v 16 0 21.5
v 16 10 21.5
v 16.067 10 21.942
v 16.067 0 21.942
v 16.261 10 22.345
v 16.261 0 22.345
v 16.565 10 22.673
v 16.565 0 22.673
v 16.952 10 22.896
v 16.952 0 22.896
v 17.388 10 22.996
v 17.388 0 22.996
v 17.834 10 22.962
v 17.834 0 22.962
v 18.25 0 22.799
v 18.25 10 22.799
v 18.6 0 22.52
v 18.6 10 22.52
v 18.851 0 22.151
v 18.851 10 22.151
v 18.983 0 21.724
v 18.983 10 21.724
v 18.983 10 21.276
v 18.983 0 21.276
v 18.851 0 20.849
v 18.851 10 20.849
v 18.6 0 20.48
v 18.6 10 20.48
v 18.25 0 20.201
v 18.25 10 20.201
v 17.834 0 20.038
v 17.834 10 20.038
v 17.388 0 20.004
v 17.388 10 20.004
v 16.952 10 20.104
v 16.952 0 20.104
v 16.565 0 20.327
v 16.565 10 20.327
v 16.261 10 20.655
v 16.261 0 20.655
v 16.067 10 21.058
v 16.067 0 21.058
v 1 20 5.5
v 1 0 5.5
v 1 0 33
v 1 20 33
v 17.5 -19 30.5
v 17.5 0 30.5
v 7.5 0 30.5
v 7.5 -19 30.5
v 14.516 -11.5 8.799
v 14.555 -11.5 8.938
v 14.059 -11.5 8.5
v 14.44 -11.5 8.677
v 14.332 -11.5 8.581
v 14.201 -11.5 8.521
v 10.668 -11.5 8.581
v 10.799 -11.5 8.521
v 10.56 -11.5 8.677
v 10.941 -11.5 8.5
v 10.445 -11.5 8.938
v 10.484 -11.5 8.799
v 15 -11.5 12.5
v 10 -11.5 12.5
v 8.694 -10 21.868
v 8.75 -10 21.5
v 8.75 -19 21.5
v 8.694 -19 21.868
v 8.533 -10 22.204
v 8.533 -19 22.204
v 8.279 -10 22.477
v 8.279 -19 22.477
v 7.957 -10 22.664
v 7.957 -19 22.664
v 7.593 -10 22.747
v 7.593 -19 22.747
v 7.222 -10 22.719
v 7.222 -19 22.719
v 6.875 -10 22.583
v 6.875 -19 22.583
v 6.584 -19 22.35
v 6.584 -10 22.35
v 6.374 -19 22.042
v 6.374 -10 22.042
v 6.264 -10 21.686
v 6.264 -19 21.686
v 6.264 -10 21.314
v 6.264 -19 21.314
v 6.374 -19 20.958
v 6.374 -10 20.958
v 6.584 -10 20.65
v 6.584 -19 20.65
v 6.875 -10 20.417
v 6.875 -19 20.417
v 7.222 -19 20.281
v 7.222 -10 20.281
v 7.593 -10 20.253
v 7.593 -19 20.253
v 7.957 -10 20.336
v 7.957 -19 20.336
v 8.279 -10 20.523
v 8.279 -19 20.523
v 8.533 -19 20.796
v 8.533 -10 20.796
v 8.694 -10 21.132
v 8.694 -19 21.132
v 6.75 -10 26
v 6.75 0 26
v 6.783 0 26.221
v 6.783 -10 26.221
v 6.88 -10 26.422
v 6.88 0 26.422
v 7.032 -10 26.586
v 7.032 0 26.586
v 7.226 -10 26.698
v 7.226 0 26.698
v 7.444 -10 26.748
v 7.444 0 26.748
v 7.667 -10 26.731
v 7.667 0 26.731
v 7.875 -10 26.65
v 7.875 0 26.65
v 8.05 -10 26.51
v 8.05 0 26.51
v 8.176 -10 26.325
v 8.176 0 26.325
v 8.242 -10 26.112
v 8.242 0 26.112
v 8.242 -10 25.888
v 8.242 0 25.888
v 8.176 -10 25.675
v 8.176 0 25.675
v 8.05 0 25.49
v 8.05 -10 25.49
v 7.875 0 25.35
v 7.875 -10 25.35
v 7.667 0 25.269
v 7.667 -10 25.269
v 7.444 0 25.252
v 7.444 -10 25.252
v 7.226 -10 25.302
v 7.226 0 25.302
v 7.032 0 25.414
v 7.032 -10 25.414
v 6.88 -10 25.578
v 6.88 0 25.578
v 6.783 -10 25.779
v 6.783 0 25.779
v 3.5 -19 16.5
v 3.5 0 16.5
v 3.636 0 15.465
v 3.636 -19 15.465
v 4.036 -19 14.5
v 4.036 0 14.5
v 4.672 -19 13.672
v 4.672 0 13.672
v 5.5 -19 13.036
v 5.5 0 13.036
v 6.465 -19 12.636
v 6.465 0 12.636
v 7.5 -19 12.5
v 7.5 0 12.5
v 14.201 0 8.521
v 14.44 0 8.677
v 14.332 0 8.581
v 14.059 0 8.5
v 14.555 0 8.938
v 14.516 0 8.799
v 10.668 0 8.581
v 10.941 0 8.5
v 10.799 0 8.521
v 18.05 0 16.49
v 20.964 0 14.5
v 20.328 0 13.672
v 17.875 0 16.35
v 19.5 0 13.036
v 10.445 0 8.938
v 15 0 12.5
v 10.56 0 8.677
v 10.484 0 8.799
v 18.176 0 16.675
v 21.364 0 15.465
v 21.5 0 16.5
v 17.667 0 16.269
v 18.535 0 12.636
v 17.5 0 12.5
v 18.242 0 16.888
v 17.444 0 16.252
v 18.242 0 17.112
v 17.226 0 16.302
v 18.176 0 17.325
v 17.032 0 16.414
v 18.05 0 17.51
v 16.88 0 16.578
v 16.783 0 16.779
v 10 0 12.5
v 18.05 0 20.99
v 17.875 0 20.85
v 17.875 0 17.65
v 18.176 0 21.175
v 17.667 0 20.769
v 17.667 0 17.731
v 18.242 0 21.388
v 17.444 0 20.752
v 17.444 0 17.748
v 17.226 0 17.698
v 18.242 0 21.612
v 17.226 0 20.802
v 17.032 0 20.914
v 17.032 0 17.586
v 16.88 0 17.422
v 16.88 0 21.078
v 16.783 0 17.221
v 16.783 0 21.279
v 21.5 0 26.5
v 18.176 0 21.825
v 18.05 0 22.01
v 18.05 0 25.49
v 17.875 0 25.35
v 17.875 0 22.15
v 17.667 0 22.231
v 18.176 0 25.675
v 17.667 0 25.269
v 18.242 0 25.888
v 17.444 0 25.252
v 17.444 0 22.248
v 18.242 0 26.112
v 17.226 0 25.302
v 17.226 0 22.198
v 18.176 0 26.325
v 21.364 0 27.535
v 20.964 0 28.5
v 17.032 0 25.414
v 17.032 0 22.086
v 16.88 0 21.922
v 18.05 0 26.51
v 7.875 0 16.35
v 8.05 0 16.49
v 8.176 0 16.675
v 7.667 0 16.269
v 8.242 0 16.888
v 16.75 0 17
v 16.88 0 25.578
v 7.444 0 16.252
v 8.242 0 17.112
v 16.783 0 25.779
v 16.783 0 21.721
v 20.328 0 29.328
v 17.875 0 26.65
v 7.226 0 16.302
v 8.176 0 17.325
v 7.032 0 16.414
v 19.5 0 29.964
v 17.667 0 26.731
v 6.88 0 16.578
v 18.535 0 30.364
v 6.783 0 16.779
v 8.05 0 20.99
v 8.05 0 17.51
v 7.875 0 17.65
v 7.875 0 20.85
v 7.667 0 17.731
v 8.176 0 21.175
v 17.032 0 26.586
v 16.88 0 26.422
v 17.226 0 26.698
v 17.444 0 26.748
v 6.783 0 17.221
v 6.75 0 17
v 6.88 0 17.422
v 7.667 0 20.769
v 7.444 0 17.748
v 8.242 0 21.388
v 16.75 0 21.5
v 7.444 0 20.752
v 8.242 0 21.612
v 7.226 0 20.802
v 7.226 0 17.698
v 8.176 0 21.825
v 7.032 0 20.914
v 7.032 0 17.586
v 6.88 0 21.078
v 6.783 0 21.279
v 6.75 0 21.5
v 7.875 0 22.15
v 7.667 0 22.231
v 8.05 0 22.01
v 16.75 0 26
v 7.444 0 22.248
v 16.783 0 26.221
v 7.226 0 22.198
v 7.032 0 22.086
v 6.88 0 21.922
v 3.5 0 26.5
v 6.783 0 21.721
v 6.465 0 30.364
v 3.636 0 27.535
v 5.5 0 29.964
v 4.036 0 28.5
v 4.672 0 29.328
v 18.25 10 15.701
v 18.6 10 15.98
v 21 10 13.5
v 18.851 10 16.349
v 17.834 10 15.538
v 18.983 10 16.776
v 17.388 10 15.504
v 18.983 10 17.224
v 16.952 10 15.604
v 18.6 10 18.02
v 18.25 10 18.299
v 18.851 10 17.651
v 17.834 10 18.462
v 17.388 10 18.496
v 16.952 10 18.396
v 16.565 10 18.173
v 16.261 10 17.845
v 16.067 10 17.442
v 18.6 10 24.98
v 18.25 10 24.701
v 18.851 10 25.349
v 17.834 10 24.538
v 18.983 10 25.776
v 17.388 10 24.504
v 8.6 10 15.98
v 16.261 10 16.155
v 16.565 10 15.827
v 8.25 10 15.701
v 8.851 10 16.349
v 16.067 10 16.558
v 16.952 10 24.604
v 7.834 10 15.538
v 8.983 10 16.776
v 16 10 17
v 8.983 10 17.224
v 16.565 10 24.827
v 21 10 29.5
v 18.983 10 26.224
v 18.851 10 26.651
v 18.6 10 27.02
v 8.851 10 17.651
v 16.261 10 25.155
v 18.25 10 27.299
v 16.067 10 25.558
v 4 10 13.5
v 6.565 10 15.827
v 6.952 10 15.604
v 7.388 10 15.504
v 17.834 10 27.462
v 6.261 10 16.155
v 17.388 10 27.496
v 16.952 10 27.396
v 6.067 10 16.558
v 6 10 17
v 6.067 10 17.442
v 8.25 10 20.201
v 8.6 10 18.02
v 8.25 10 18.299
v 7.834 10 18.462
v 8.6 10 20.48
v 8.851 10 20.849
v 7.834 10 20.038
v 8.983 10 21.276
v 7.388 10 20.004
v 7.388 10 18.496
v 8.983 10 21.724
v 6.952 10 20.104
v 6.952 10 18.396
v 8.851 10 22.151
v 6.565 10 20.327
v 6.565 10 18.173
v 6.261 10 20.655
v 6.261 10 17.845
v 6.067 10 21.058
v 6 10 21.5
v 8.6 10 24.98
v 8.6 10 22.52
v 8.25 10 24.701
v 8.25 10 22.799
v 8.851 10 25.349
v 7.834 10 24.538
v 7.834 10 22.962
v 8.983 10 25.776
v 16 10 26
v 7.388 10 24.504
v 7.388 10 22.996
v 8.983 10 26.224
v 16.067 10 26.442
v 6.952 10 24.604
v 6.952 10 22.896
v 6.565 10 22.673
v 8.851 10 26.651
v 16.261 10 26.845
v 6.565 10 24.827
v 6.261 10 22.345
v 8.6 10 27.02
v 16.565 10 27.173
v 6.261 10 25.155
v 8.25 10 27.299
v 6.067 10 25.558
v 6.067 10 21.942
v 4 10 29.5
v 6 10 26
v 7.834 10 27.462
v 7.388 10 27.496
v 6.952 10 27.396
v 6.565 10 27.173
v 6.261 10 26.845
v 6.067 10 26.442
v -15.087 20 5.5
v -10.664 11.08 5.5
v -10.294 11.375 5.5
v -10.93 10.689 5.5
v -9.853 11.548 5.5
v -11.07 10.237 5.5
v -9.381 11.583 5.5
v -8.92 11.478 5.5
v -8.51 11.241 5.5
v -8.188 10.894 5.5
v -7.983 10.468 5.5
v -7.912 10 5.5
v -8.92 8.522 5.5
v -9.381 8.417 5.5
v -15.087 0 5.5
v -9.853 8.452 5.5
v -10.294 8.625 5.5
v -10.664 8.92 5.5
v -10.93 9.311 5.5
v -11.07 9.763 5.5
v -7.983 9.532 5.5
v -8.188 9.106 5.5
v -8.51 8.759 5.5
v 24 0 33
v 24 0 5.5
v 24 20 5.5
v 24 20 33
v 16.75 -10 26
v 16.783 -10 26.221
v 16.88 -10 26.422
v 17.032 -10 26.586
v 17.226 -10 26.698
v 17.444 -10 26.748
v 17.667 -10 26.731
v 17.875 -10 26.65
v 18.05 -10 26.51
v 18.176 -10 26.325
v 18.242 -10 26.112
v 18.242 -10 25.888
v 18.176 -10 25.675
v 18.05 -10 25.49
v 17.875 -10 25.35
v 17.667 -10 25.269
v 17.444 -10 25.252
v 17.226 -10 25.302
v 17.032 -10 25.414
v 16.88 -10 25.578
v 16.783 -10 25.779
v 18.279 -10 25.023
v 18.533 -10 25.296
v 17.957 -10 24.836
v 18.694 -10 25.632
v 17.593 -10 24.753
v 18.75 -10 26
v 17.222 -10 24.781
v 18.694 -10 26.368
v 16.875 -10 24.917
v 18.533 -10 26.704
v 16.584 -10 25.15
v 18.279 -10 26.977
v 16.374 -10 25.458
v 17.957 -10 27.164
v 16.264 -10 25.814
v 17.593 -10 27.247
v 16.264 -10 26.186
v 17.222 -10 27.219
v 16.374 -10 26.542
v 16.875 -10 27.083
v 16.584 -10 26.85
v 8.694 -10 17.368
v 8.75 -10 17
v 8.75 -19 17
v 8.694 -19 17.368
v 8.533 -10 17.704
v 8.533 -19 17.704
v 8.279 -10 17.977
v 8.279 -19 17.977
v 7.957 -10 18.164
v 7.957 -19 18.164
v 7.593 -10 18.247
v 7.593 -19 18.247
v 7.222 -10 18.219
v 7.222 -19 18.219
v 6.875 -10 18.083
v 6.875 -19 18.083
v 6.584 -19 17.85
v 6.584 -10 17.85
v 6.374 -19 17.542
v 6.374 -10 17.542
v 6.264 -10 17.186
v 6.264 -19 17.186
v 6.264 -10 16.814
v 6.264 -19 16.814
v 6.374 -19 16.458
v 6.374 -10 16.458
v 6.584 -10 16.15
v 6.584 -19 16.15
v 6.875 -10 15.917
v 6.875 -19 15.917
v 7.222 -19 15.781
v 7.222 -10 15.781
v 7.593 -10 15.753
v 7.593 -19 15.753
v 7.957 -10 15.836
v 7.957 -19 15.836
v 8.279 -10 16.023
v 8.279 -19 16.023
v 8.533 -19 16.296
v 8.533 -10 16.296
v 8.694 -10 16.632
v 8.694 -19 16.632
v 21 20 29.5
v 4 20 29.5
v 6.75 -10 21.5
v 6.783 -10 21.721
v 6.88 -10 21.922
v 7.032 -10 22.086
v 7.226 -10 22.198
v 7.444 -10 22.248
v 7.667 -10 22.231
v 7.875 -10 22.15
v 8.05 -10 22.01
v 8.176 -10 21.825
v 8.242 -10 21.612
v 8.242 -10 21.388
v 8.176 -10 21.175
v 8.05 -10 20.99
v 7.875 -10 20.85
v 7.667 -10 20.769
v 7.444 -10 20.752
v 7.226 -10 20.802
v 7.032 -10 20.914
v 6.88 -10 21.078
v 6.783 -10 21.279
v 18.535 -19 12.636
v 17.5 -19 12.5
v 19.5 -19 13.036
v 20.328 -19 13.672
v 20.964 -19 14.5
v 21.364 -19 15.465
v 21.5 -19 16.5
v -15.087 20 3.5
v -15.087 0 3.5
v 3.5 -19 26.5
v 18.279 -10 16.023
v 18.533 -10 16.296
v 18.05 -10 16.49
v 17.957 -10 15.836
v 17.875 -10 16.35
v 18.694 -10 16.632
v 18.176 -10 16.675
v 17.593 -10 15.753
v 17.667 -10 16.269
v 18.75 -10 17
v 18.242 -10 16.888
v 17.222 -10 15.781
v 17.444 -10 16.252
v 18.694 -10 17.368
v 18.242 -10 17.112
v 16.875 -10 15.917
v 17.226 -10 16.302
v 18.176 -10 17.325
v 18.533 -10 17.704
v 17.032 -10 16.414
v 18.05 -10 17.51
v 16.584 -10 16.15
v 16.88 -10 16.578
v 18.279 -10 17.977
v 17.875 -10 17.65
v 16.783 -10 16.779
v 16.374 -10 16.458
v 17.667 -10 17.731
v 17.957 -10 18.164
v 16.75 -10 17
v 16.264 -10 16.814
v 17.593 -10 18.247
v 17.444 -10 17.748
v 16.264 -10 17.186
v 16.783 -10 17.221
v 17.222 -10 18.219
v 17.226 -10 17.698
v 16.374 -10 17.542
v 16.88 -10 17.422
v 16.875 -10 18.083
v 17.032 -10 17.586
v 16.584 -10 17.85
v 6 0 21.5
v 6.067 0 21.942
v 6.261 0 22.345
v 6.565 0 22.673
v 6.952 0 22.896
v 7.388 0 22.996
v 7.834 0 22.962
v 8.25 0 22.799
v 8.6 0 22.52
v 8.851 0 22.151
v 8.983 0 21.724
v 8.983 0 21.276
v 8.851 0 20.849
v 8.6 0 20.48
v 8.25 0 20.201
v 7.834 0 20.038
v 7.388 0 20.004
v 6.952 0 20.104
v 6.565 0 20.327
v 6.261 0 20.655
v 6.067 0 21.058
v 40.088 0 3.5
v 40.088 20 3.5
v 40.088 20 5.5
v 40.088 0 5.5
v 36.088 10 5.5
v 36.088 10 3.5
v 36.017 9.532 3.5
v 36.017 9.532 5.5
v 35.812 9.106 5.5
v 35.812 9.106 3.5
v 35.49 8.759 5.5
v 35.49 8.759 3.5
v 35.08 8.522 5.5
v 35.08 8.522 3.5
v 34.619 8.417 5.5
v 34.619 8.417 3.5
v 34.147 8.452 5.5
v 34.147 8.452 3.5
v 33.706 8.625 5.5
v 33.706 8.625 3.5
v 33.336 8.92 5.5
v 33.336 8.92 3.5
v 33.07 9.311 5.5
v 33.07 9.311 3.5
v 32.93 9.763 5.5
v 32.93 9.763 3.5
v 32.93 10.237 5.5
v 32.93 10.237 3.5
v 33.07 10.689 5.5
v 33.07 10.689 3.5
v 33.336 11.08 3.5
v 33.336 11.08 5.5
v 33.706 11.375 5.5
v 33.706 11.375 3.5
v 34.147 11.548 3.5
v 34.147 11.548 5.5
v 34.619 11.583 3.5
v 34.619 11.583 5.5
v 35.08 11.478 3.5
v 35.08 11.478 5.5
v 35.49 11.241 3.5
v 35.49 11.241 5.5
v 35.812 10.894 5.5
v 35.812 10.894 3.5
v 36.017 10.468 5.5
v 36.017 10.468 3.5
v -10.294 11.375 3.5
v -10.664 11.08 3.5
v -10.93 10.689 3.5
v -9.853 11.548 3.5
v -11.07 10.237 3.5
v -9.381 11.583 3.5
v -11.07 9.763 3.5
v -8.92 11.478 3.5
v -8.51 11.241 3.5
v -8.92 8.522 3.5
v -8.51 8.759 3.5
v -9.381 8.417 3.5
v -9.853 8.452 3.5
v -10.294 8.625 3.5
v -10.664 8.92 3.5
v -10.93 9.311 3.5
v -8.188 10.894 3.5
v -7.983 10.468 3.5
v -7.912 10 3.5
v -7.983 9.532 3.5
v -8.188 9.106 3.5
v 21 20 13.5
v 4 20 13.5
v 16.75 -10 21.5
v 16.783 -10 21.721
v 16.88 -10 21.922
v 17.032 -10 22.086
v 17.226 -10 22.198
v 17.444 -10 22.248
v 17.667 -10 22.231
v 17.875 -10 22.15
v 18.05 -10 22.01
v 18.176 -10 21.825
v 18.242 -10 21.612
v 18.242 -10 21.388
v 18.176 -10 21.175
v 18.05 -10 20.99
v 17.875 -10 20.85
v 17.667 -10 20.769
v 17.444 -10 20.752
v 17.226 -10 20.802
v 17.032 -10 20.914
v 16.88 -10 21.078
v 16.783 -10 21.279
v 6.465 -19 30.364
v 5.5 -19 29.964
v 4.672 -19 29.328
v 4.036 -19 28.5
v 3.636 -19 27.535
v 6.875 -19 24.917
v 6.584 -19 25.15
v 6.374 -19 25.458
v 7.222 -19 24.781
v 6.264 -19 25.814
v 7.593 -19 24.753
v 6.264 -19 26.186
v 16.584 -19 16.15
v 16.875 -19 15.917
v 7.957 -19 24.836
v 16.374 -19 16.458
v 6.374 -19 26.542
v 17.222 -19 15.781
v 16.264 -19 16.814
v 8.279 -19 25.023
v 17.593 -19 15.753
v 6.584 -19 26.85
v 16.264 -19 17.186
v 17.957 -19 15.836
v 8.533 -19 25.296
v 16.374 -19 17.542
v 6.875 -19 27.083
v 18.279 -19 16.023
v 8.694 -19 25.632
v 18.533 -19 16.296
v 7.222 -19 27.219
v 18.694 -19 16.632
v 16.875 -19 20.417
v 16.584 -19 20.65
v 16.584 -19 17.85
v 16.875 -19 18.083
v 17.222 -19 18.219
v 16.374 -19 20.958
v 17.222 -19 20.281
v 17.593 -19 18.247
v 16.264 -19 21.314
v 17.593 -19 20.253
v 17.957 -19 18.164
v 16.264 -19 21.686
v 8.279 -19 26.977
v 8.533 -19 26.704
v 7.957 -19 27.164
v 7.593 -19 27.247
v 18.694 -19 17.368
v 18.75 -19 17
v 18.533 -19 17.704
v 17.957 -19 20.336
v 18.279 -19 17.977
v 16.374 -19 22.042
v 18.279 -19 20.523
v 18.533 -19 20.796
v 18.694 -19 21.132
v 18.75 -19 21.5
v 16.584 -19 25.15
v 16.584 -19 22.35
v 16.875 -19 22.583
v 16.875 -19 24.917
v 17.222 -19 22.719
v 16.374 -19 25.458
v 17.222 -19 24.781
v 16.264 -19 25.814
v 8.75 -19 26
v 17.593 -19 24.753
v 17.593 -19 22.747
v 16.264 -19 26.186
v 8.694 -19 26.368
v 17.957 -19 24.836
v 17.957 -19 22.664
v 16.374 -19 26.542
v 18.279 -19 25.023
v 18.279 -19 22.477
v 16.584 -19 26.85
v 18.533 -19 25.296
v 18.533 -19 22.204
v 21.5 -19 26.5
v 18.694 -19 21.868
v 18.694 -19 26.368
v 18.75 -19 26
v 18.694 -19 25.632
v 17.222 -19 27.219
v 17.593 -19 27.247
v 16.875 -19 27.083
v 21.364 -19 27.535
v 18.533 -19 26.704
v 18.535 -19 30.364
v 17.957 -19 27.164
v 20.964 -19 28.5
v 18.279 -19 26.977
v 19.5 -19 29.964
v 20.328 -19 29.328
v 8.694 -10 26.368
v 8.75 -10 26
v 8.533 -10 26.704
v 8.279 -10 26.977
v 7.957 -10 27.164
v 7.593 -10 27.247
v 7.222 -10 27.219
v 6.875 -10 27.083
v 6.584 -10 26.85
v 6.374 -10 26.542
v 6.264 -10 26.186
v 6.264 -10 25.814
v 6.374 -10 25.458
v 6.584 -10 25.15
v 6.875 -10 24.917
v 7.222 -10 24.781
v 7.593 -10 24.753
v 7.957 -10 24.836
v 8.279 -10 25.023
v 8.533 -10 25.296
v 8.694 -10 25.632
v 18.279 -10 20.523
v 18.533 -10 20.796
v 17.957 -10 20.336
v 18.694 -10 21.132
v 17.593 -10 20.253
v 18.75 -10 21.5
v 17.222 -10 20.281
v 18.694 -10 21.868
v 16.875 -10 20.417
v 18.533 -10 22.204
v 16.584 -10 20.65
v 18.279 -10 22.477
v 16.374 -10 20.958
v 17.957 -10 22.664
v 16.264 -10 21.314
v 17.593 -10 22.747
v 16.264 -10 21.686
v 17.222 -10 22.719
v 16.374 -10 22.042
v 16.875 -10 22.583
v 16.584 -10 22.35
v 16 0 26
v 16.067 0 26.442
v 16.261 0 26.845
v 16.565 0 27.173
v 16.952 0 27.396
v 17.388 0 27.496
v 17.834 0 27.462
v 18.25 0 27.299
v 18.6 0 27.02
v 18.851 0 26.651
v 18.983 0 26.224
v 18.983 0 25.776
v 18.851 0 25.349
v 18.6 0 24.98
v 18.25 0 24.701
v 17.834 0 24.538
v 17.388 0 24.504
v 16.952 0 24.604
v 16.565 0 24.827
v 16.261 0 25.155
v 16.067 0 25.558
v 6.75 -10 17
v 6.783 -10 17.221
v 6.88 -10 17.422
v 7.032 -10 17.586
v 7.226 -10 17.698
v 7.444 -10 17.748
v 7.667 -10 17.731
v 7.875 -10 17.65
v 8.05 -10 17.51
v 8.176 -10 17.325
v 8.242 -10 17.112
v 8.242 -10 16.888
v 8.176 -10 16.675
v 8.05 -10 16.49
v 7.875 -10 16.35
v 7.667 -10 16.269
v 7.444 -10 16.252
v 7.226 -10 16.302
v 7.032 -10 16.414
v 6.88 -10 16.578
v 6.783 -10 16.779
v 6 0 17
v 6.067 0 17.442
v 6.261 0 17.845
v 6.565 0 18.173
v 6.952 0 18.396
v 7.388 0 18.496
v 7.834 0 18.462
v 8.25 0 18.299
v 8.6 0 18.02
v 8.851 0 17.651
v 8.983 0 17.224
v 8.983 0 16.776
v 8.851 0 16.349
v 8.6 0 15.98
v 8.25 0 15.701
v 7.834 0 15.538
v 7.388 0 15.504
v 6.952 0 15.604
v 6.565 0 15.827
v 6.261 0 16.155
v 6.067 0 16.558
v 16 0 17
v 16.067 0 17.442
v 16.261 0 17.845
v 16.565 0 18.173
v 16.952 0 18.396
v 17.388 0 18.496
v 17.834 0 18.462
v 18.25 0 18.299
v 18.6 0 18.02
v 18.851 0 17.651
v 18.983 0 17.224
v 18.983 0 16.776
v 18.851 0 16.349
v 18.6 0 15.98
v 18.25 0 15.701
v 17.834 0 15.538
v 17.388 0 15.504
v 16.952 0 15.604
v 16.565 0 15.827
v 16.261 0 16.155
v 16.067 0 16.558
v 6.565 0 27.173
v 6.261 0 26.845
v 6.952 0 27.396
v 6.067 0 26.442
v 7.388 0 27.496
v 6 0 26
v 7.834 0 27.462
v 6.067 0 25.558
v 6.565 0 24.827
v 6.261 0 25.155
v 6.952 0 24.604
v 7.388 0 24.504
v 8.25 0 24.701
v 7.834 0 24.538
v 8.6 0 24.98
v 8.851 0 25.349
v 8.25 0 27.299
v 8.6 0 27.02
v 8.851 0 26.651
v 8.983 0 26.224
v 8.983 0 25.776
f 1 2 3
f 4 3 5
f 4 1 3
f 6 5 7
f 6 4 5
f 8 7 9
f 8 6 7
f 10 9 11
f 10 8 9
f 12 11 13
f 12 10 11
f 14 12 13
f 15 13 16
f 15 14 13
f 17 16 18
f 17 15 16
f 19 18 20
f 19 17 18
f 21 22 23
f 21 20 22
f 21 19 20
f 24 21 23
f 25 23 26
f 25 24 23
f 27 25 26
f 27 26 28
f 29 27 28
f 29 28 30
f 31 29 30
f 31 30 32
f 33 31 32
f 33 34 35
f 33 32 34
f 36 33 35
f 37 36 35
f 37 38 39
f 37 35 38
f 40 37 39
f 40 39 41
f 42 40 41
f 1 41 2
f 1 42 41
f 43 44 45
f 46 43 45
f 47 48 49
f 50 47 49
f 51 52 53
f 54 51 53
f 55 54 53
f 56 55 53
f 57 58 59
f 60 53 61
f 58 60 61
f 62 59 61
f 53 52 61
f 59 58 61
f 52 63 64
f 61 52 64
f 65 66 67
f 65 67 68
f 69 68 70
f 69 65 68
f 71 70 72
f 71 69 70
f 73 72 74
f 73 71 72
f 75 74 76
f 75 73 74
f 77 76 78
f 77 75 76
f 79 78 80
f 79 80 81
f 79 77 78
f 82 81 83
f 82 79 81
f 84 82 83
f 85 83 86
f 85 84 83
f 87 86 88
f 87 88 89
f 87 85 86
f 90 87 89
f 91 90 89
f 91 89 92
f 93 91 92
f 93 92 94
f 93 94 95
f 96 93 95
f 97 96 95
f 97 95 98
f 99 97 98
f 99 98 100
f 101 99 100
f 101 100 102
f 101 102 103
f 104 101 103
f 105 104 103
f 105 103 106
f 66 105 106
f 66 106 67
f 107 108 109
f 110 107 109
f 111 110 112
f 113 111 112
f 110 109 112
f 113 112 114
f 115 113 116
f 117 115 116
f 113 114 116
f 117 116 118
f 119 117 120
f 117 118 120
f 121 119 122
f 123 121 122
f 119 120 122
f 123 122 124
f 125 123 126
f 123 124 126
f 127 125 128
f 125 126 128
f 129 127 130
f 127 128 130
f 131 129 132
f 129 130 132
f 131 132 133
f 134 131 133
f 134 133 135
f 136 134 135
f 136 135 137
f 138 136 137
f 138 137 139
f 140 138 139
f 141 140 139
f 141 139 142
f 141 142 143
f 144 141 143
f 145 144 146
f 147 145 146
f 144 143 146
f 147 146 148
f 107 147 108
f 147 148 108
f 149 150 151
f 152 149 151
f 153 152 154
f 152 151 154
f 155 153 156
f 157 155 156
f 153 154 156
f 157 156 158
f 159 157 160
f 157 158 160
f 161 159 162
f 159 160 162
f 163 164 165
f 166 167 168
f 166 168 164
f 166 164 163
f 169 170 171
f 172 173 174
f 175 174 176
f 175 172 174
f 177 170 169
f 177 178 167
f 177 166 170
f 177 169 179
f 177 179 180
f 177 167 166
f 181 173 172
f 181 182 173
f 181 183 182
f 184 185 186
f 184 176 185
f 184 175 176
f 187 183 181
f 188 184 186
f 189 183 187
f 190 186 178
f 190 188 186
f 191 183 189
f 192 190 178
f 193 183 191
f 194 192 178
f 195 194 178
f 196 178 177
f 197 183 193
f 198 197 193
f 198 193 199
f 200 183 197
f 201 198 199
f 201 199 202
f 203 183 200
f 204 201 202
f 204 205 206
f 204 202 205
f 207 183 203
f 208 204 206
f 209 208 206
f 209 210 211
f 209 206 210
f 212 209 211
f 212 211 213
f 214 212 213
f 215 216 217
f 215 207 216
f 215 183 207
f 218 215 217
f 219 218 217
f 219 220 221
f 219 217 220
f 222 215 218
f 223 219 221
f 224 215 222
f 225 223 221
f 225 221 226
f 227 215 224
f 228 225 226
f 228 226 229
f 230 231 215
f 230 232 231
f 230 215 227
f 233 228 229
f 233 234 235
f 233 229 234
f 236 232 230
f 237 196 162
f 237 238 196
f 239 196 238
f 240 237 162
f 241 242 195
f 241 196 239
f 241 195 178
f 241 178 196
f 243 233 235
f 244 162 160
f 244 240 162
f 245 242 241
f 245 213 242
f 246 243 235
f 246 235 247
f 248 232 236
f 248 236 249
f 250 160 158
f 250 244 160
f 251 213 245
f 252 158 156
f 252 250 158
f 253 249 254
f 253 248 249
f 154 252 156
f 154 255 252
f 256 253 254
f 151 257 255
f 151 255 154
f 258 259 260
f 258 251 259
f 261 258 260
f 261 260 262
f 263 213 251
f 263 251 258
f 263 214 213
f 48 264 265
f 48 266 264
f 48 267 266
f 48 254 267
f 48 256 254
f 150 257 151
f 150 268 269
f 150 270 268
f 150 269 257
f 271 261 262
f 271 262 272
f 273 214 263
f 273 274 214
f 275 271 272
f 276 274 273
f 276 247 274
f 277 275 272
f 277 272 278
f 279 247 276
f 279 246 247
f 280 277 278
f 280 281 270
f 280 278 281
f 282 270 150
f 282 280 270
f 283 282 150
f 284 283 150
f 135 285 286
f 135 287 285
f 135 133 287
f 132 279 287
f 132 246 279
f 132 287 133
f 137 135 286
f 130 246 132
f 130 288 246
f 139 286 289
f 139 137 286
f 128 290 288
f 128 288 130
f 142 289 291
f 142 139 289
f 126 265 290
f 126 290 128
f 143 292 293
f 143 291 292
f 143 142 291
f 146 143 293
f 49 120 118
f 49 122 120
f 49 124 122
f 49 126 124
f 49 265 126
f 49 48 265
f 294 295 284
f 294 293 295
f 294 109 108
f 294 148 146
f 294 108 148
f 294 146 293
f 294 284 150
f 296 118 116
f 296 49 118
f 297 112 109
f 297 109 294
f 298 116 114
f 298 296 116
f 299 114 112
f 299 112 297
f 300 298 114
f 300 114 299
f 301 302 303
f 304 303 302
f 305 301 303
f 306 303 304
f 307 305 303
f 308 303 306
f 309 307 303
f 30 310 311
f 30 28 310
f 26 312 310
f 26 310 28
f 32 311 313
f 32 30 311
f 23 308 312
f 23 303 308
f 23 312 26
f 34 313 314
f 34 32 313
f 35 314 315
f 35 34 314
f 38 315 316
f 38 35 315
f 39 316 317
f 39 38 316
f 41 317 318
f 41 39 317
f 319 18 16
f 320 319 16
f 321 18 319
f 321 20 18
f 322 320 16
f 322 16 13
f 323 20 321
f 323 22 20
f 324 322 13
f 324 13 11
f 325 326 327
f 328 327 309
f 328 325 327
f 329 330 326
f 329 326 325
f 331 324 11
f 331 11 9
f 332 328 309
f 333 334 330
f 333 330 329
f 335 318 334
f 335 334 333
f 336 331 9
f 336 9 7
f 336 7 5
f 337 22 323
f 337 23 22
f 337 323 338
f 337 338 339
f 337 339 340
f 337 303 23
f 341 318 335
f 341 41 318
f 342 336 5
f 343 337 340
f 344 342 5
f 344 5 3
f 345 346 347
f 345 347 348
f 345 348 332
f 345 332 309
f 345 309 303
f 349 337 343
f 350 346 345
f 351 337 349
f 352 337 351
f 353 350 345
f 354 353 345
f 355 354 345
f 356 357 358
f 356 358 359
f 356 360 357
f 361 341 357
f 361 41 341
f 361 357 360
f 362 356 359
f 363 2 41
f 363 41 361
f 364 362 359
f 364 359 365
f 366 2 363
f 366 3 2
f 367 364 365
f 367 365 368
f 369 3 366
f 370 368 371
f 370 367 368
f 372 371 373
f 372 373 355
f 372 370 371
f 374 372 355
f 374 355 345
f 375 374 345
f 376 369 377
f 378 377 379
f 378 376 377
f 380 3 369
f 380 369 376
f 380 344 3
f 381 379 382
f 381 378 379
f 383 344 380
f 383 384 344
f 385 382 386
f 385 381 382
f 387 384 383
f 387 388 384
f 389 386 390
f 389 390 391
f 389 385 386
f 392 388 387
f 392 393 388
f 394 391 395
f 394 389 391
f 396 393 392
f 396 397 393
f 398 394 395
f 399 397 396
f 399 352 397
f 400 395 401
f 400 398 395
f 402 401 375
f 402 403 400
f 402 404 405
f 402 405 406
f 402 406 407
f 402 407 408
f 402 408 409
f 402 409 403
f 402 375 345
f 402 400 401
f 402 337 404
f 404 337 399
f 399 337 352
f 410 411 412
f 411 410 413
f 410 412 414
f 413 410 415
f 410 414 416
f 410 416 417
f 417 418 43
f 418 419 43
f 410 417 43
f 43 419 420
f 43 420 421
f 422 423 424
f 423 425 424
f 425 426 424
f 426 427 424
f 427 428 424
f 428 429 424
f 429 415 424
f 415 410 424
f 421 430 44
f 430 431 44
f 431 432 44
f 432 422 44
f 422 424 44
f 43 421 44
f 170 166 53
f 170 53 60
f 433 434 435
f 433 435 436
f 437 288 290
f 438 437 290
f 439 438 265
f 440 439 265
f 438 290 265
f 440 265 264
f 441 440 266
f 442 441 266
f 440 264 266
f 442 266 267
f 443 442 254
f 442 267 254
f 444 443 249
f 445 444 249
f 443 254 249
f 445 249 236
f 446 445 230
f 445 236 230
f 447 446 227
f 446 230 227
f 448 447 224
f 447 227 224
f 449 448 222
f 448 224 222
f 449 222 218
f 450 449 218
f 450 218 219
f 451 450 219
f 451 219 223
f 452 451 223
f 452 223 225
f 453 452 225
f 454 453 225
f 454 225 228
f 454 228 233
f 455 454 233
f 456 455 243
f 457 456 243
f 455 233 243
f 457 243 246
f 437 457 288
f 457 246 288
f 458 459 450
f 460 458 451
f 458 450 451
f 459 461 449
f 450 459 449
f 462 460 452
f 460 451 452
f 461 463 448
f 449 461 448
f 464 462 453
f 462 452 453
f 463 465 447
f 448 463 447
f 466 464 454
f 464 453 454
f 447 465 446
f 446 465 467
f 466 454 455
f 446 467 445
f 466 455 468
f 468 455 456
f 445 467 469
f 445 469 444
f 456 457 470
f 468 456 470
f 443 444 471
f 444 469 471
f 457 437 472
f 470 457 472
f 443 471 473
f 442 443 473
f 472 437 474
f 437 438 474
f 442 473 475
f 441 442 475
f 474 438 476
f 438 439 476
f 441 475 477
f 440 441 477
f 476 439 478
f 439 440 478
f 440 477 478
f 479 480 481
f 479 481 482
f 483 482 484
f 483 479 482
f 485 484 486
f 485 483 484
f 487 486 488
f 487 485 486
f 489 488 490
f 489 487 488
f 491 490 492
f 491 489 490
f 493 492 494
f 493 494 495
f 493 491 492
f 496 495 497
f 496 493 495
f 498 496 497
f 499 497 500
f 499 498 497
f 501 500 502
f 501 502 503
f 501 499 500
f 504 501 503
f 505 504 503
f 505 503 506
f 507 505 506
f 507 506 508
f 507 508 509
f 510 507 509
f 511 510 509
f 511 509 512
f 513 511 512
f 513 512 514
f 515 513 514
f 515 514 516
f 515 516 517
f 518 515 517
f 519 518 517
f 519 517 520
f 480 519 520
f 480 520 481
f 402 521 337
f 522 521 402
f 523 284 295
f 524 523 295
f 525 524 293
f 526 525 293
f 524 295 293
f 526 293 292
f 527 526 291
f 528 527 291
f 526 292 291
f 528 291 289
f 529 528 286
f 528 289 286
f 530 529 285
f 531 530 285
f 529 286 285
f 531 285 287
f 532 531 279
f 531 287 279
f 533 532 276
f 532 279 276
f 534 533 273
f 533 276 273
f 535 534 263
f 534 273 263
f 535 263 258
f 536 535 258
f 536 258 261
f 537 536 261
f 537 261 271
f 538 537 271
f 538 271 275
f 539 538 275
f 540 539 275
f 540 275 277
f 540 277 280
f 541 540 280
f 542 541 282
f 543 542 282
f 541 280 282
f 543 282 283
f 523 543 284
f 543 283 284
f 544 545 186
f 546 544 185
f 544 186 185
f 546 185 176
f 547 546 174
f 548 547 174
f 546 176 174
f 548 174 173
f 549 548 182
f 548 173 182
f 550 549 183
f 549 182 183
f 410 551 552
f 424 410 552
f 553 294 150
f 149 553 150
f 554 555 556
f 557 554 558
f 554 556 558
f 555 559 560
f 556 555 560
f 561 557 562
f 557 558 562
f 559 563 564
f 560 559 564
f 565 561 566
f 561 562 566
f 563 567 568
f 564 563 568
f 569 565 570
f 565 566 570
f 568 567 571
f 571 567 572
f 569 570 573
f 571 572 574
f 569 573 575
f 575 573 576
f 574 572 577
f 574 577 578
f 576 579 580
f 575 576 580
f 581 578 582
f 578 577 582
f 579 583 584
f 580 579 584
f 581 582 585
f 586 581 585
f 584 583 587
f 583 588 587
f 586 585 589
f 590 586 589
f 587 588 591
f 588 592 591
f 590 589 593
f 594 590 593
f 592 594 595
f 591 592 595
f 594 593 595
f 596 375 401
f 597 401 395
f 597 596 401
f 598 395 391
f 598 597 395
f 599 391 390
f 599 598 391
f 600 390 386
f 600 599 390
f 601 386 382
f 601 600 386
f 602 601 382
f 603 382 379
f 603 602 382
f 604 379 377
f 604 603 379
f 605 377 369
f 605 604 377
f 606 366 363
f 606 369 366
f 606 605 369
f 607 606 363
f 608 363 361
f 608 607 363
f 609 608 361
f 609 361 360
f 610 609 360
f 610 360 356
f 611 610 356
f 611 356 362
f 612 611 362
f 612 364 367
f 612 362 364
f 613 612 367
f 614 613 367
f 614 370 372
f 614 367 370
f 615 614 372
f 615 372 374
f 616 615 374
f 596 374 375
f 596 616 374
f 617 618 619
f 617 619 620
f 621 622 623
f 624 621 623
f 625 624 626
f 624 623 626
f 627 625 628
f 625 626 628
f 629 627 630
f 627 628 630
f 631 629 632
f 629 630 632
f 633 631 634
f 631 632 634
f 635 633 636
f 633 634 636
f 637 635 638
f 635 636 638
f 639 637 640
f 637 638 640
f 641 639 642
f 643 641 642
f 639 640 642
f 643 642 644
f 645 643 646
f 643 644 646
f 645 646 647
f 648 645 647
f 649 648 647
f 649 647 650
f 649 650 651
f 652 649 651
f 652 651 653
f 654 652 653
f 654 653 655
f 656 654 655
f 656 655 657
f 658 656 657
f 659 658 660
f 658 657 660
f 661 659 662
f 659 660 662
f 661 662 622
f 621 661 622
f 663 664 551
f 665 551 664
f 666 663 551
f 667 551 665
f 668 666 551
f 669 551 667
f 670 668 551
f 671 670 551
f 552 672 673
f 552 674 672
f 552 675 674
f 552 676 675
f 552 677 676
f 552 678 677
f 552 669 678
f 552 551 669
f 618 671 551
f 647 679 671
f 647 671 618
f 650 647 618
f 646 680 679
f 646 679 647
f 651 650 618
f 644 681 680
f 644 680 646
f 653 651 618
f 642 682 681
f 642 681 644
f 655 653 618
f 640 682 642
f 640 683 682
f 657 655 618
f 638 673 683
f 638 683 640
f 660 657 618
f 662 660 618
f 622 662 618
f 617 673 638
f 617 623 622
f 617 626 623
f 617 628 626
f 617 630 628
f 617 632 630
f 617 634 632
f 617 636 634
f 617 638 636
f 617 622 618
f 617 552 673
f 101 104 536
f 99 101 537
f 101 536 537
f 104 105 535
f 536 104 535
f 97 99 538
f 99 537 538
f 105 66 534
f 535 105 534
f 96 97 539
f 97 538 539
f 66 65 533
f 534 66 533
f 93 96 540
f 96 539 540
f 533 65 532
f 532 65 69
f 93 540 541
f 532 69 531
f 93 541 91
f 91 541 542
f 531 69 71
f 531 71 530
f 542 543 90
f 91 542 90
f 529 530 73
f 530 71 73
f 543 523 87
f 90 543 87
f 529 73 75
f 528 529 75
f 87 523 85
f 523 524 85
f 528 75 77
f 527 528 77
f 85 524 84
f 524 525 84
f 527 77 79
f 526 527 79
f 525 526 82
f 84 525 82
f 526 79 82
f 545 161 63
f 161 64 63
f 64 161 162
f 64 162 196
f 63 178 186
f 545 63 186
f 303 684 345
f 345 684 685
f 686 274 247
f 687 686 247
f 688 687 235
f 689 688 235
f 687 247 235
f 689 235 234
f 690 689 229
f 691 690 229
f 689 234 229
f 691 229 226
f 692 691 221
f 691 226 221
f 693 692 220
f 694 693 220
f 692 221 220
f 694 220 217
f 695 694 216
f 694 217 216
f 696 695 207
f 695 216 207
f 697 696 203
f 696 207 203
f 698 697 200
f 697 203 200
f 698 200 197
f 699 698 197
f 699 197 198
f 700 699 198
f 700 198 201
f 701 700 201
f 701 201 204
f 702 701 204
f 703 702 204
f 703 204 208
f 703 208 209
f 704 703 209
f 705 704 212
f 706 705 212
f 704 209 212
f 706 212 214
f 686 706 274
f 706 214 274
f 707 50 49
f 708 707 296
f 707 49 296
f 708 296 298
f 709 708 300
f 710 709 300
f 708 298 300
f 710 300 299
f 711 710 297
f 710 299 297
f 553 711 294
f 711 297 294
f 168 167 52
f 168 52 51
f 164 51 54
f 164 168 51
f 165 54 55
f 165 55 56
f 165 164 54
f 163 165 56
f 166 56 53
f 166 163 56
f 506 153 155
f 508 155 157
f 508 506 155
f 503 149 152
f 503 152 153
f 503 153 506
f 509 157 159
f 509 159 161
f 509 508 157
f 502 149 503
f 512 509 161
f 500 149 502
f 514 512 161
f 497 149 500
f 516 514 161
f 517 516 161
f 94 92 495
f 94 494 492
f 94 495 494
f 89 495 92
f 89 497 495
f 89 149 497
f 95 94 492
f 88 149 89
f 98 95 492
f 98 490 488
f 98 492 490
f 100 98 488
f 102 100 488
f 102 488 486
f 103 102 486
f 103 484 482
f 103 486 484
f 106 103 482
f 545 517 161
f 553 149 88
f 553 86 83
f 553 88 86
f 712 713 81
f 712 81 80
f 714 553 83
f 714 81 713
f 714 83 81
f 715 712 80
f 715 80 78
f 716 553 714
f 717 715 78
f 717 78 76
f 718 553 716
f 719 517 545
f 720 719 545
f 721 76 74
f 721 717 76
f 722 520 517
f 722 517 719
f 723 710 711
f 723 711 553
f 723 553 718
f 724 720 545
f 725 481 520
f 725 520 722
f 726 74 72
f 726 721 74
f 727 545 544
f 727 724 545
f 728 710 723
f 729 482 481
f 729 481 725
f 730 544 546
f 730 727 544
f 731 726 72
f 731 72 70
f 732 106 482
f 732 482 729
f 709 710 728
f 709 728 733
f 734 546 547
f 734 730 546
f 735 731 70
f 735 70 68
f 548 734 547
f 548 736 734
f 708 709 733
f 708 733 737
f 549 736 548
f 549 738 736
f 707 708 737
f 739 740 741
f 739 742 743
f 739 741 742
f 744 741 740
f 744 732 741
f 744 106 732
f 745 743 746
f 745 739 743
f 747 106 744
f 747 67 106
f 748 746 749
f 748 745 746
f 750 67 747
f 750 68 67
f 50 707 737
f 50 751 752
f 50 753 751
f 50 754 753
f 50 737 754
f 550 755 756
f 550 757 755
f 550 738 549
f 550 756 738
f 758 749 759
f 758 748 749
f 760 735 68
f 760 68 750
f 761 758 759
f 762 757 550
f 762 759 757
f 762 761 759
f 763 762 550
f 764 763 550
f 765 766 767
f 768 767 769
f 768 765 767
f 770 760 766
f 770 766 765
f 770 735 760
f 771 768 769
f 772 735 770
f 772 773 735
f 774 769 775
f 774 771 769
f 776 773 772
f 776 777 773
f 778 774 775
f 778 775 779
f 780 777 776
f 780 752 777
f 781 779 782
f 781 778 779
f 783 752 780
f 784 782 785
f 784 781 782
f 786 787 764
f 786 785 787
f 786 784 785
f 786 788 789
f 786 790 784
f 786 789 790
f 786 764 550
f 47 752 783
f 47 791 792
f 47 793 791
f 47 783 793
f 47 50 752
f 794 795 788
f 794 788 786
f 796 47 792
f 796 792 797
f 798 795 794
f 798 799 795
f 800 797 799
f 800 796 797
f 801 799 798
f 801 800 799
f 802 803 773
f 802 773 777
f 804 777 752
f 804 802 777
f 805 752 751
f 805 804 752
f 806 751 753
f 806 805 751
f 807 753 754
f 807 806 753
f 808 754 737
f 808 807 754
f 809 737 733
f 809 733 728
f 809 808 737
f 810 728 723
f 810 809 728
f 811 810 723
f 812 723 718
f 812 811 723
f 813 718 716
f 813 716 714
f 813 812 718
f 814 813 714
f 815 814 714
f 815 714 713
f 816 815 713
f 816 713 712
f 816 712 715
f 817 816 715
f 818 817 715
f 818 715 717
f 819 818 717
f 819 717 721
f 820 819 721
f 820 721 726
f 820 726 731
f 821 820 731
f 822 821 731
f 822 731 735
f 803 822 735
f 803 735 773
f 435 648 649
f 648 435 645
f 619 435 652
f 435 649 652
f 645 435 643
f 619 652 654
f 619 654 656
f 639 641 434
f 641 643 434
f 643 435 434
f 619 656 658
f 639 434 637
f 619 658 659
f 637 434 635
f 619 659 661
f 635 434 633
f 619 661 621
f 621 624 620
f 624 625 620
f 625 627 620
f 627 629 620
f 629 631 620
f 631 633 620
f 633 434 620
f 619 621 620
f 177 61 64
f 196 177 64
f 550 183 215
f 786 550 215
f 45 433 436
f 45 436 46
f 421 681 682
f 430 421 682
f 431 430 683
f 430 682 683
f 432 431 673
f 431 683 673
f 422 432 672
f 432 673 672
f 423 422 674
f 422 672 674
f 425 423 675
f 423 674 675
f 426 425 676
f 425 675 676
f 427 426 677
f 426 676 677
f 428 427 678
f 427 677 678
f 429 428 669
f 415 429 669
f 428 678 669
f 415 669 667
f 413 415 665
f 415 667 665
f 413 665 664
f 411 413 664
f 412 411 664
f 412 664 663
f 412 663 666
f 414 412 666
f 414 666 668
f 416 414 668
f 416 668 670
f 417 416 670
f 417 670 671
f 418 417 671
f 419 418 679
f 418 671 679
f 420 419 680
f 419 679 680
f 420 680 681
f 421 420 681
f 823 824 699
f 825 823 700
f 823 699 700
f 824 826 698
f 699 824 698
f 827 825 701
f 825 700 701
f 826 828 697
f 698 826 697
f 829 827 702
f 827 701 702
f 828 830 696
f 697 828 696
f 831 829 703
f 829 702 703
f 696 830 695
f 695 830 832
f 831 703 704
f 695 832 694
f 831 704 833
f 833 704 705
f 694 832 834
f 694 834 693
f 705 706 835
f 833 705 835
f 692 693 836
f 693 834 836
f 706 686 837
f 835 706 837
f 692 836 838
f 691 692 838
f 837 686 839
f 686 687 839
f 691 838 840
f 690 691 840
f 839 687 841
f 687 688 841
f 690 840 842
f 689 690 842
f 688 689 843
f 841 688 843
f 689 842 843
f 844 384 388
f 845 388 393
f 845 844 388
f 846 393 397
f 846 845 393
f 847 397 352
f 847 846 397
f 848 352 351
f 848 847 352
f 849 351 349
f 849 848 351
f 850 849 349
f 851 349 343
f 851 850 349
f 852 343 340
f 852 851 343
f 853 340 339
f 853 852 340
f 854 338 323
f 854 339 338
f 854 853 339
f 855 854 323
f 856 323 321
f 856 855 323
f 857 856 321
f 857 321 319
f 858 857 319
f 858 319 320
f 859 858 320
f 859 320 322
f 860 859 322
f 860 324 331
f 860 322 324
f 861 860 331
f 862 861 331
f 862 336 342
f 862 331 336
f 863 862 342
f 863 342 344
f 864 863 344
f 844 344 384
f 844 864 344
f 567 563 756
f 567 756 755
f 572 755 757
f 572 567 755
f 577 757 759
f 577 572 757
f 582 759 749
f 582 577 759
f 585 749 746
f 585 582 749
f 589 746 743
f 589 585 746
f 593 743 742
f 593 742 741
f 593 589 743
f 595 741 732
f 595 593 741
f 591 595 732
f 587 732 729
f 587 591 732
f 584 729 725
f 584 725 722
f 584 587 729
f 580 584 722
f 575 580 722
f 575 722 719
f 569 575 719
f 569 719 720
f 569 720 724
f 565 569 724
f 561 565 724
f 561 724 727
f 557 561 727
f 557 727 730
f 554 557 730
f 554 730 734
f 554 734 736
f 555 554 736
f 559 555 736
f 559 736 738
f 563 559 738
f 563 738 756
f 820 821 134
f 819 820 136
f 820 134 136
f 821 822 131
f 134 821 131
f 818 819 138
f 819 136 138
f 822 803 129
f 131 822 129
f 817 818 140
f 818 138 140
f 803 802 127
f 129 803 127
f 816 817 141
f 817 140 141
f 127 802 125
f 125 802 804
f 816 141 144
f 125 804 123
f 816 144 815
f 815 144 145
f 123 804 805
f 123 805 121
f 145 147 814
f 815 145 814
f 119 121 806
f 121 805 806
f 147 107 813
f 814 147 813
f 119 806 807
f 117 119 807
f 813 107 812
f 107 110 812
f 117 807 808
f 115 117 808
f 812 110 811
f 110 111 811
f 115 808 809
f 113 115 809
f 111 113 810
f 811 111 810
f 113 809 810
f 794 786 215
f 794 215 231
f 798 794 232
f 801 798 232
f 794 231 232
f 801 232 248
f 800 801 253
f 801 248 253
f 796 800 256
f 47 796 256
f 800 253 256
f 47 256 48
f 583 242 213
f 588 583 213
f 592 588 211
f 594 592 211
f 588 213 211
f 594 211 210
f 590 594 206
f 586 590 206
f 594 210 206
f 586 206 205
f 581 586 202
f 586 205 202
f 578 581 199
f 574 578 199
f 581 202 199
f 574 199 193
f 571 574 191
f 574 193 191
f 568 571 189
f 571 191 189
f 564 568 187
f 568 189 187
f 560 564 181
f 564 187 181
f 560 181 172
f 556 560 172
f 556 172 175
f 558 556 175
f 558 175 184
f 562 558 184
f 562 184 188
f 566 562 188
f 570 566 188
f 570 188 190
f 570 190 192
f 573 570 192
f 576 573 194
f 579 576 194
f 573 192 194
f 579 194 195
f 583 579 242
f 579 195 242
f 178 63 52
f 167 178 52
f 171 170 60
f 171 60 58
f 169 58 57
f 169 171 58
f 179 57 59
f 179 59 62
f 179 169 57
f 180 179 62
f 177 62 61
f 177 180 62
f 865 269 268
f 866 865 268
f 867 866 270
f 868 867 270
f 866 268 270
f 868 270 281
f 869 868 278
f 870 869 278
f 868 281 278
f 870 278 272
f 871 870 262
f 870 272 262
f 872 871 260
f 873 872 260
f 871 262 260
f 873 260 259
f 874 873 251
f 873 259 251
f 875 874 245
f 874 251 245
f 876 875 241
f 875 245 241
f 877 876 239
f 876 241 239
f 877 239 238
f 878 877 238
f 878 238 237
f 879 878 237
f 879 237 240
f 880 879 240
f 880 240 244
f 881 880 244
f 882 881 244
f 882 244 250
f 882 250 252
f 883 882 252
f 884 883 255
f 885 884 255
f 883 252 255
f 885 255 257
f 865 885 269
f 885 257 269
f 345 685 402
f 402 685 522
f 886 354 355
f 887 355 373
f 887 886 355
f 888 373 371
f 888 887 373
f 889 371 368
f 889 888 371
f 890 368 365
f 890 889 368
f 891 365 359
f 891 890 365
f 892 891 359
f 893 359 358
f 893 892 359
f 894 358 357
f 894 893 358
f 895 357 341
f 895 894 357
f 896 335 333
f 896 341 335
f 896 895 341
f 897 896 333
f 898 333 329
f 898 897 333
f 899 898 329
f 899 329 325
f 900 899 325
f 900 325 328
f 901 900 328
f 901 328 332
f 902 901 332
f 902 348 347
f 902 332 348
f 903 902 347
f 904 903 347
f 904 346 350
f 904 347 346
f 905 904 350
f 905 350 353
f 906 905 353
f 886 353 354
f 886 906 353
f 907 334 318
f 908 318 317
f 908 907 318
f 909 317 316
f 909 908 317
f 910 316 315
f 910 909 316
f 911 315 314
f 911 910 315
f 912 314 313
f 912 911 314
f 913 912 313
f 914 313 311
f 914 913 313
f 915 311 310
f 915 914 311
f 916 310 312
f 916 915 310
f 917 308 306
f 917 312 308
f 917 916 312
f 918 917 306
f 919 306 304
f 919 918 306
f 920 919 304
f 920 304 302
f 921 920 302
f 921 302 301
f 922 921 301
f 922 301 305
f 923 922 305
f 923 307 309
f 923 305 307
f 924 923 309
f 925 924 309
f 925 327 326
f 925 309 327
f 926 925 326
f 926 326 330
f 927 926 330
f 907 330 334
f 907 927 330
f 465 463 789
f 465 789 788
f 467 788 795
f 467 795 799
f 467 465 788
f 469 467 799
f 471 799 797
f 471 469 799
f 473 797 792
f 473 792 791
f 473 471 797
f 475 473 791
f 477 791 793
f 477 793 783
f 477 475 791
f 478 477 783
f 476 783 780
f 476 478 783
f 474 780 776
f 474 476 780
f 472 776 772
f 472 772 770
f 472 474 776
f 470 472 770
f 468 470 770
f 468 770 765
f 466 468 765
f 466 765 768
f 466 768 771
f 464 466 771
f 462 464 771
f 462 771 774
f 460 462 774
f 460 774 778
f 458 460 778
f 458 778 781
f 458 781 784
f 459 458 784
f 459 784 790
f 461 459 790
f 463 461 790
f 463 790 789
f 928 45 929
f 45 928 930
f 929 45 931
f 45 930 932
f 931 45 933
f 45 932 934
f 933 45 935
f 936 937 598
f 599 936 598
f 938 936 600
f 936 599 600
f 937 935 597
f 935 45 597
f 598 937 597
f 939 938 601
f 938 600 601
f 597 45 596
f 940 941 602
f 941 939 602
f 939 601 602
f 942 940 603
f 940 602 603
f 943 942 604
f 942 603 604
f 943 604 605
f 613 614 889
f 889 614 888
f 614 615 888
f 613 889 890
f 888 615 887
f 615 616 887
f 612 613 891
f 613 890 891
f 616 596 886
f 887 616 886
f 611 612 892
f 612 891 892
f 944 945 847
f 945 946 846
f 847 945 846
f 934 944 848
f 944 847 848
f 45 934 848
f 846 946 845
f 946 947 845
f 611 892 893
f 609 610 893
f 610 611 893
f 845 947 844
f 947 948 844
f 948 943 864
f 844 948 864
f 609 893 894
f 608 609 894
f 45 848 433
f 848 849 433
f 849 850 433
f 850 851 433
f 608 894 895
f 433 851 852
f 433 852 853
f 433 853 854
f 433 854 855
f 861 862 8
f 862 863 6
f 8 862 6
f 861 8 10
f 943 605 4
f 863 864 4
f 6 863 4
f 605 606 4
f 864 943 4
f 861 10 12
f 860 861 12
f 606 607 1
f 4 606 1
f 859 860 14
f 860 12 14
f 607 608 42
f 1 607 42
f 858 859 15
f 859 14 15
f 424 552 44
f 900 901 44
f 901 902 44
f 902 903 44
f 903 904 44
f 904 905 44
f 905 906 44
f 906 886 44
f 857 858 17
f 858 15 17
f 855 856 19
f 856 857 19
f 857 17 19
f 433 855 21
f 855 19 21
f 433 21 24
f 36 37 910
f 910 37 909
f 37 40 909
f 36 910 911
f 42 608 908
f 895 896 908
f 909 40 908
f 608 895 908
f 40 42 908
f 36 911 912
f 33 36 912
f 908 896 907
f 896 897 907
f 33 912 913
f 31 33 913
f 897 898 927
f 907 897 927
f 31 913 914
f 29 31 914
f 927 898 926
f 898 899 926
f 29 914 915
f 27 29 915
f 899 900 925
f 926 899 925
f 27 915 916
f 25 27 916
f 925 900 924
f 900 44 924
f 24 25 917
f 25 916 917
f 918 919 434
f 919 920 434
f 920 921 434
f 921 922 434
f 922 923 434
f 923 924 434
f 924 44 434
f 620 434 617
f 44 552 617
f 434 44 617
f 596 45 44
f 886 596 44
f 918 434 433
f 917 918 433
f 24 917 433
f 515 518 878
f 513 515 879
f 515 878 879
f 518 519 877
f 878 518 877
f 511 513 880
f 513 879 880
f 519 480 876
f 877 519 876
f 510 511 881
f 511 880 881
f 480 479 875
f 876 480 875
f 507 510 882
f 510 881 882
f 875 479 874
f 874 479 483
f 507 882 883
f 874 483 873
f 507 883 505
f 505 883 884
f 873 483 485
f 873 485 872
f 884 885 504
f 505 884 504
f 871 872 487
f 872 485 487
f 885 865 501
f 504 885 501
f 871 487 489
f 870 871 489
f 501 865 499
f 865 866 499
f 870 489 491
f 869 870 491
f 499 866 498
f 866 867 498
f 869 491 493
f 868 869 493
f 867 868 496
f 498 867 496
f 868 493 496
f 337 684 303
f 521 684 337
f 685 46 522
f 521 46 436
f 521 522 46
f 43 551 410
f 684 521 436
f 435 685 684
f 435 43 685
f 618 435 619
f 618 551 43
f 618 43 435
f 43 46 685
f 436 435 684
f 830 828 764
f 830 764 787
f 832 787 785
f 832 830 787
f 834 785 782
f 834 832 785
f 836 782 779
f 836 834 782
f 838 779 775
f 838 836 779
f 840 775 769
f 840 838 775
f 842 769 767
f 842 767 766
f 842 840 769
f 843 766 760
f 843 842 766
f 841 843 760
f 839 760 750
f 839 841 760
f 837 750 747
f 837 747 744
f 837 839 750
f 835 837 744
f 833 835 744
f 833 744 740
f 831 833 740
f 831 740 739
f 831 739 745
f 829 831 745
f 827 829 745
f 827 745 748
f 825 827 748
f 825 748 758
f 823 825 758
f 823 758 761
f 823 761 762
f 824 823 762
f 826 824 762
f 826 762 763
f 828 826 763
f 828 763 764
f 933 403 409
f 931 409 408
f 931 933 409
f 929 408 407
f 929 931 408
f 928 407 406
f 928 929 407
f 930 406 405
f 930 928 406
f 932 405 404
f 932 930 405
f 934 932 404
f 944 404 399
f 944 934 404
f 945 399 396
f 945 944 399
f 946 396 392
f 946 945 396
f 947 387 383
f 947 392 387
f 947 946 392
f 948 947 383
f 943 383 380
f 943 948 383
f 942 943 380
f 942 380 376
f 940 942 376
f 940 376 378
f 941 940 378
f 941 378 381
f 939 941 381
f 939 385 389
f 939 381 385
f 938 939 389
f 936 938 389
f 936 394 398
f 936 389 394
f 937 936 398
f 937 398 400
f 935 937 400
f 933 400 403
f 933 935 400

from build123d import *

# Parameters (mm, degrees)
F0_R      = 1.25
F1_DEPTH  = 19
F3_DEPTH  = 11.5
F4_R      = 1.25
F4_R_2    = 0.75
F5_DEPTH  = 10
F6_W      = 23
F6_H      = 29.5
F6_R      = 1.5
F7_DEPTH  = 20
F8_W      = 16.0875
F8_H      = 20
F8_R      = 1.5875
F9_DEPTH  = 2
F10_W     = 17
F10_H     = 16
F11_DEPTH = 10


with BuildPart() as f1:
    # F0 (on Front) → F1 (new body)
    with BuildSketch(Plane.XZ):
        with BuildLine():
            Line((17.5, 30.5), (7.5, 30.5))
            ThreePointArc((7.5, 30.5), (4.671573, 29.328427), (3.5, 26.5))
            Line((3.5, 26.5), (3.5, 16.5))
            ThreePointArc((3.5, 16.5), (4.671573, 13.671573), (7.5, 12.5))
            Line((7.5, 12.5), (17.5, 12.5))
            ThreePointArc((17.5, 12.5), (20.328427, 13.671573), (21.5, 16.5))
            Line((21.5, 16.5), (21.5, 26.5))
            ThreePointArc((21.5, 26.5), (20.328427, 29.328427), (17.5, 30.5))
        make_face()
        with Locations((7.5, 17)):
            Circle(F0_R, mode=Mode.SUBTRACT)
        with Locations((17.5, 17)):
            Circle(F0_R, mode=Mode.SUBTRACT)
        with Locations((7.5, 21.5)):
            Circle(F0_R, mode=Mode.SUBTRACT)
        with Locations((7.5, 26)):
            Circle(F0_R, mode=Mode.SUBTRACT)
        with Locations((17.5, 21.5)):
            Circle(F0_R, mode=Mode.SUBTRACT)
        with Locations((17.5, 26)):
            Circle(F0_R, mode=Mode.SUBTRACT)
    extrude(amount=F1_DEPTH)

    # F2 (on face) → F3 (join)
    with BuildSketch(Plane(origin=(0, 0, 0), x_dir=(-1, 0, 0), z_dir=(0, 1, 0))):
        with BuildLine():
            Line((-10, 12.5), (-15, 12.5))
            Line((-15, 12.5), (-14.554748, 8.937983))
            ThreePointArc((-14.554748, 8.937983), (-14.38951, 8.625161), (-14.058609, 8.5))
            Line((-14.058609, 8.5), (-10.941391, 8.5))
            ThreePointArc((-10.941391, 8.5), (-10.61049, 8.625161), (-10.445252, 8.937983))
            Line((-10.445252, 8.937983), (-10, 12.5))
        make_face()
    extrude(amount=-F3_DEPTH)

    # F4 (on face) → F5 (join)
    with BuildSketch(Plane(origin=(0, 0, 0), x_dir=(-1, 0, 0), z_dir=(0, 1, 0))):
        with Locations((-17.5, 26)):
            Circle(F4_R)
        with Locations((-17.5, 26)):
            Circle(F4_R_2, mode=Mode.SUBTRACT)
        with Locations((-7.5, 26)):
            Circle(F4_R)
        with Locations((-7.5, 26)):
            Circle(F4_R_2, mode=Mode.SUBTRACT)
        with Locations((-7.5, 21.5)):
            Circle(F4_R)
        with Locations((-7.5, 21.5)):
            Circle(F4_R_2, mode=Mode.SUBTRACT)
        with Locations((-7.5, 17)):
            Circle(F4_R)
        with Locations((-7.5, 17)):
            Circle(F4_R_2, mode=Mode.SUBTRACT)
        with Locations((-17.5, 17)):
            Circle(F4_R)
        with Locations((-17.5, 17)):
            Circle(F4_R_2, mode=Mode.SUBTRACT)
        with Locations((-17.5, 21.5)):
            Circle(F4_R)
        with Locations((-17.5, 21.5)):
            Circle(F4_R_2, mode=Mode.SUBTRACT)
    extrude(amount=-F5_DEPTH)


with BuildPart() as f7:
    # F6 (on face) → F7 (new body)
    with BuildSketch(Plane(origin=(0, 0, 0), x_dir=(-1, 0, 0), z_dir=(0, 1, 0))):
        with Locations((-12.5, 18.25)):
            Rectangle(F6_W, F6_H)
        with Locations((-17.5, 17)):
            Circle(F6_R, mode=Mode.SUBTRACT)
        with Locations((-7.5, 17)):
            Circle(F6_R, mode=Mode.SUBTRACT)
        with Locations((-17.5, 21.5)):
            Circle(F6_R, mode=Mode.SUBTRACT)
        with Locations((-17.5, 26)):
            Circle(F6_R, mode=Mode.SUBTRACT)
        with Locations((-7.5, 21.5)):
            Circle(F6_R, mode=Mode.SUBTRACT)
        with Locations((-7.5, 26)):
            Circle(F6_R, mode=Mode.SUBTRACT)
    extrude(amount=F7_DEPTH)

    # F8 (on face) → F9 (join)
    with BuildSketch(Plane(origin=(0, 0, 3.5), x_dir=(1, 0, 0), z_dir=(0, 0, -1))):
        with Locations((32.04375, -10)):
            Rectangle(F8_W, F8_H)
        with Locations((34.5, -10)):
            Circle(F8_R, mode=Mode.SUBTRACT)
        with Locations((-7.04375, -10)):
            Rectangle(F8_W, F8_H)
        with Locations((-9.5, -10)):
            Circle(F8_R, mode=Mode.SUBTRACT)
    extrude(amount=-F9_DEPTH)

    # F10 (on face) → F11 (cut)
    with BuildSketch(Plane(origin=(0, 20, 0), x_dir=(-1, 0, 0), z_dir=(0, 1, 0))):
        with Locations((-12.5, 21.5)):
            Rectangle(F10_W, F10_H)
    extrude(amount=-F11_DEPTH, mode=Mode.SUBTRACT)


solid = Compound([f1.part, f7.part])
